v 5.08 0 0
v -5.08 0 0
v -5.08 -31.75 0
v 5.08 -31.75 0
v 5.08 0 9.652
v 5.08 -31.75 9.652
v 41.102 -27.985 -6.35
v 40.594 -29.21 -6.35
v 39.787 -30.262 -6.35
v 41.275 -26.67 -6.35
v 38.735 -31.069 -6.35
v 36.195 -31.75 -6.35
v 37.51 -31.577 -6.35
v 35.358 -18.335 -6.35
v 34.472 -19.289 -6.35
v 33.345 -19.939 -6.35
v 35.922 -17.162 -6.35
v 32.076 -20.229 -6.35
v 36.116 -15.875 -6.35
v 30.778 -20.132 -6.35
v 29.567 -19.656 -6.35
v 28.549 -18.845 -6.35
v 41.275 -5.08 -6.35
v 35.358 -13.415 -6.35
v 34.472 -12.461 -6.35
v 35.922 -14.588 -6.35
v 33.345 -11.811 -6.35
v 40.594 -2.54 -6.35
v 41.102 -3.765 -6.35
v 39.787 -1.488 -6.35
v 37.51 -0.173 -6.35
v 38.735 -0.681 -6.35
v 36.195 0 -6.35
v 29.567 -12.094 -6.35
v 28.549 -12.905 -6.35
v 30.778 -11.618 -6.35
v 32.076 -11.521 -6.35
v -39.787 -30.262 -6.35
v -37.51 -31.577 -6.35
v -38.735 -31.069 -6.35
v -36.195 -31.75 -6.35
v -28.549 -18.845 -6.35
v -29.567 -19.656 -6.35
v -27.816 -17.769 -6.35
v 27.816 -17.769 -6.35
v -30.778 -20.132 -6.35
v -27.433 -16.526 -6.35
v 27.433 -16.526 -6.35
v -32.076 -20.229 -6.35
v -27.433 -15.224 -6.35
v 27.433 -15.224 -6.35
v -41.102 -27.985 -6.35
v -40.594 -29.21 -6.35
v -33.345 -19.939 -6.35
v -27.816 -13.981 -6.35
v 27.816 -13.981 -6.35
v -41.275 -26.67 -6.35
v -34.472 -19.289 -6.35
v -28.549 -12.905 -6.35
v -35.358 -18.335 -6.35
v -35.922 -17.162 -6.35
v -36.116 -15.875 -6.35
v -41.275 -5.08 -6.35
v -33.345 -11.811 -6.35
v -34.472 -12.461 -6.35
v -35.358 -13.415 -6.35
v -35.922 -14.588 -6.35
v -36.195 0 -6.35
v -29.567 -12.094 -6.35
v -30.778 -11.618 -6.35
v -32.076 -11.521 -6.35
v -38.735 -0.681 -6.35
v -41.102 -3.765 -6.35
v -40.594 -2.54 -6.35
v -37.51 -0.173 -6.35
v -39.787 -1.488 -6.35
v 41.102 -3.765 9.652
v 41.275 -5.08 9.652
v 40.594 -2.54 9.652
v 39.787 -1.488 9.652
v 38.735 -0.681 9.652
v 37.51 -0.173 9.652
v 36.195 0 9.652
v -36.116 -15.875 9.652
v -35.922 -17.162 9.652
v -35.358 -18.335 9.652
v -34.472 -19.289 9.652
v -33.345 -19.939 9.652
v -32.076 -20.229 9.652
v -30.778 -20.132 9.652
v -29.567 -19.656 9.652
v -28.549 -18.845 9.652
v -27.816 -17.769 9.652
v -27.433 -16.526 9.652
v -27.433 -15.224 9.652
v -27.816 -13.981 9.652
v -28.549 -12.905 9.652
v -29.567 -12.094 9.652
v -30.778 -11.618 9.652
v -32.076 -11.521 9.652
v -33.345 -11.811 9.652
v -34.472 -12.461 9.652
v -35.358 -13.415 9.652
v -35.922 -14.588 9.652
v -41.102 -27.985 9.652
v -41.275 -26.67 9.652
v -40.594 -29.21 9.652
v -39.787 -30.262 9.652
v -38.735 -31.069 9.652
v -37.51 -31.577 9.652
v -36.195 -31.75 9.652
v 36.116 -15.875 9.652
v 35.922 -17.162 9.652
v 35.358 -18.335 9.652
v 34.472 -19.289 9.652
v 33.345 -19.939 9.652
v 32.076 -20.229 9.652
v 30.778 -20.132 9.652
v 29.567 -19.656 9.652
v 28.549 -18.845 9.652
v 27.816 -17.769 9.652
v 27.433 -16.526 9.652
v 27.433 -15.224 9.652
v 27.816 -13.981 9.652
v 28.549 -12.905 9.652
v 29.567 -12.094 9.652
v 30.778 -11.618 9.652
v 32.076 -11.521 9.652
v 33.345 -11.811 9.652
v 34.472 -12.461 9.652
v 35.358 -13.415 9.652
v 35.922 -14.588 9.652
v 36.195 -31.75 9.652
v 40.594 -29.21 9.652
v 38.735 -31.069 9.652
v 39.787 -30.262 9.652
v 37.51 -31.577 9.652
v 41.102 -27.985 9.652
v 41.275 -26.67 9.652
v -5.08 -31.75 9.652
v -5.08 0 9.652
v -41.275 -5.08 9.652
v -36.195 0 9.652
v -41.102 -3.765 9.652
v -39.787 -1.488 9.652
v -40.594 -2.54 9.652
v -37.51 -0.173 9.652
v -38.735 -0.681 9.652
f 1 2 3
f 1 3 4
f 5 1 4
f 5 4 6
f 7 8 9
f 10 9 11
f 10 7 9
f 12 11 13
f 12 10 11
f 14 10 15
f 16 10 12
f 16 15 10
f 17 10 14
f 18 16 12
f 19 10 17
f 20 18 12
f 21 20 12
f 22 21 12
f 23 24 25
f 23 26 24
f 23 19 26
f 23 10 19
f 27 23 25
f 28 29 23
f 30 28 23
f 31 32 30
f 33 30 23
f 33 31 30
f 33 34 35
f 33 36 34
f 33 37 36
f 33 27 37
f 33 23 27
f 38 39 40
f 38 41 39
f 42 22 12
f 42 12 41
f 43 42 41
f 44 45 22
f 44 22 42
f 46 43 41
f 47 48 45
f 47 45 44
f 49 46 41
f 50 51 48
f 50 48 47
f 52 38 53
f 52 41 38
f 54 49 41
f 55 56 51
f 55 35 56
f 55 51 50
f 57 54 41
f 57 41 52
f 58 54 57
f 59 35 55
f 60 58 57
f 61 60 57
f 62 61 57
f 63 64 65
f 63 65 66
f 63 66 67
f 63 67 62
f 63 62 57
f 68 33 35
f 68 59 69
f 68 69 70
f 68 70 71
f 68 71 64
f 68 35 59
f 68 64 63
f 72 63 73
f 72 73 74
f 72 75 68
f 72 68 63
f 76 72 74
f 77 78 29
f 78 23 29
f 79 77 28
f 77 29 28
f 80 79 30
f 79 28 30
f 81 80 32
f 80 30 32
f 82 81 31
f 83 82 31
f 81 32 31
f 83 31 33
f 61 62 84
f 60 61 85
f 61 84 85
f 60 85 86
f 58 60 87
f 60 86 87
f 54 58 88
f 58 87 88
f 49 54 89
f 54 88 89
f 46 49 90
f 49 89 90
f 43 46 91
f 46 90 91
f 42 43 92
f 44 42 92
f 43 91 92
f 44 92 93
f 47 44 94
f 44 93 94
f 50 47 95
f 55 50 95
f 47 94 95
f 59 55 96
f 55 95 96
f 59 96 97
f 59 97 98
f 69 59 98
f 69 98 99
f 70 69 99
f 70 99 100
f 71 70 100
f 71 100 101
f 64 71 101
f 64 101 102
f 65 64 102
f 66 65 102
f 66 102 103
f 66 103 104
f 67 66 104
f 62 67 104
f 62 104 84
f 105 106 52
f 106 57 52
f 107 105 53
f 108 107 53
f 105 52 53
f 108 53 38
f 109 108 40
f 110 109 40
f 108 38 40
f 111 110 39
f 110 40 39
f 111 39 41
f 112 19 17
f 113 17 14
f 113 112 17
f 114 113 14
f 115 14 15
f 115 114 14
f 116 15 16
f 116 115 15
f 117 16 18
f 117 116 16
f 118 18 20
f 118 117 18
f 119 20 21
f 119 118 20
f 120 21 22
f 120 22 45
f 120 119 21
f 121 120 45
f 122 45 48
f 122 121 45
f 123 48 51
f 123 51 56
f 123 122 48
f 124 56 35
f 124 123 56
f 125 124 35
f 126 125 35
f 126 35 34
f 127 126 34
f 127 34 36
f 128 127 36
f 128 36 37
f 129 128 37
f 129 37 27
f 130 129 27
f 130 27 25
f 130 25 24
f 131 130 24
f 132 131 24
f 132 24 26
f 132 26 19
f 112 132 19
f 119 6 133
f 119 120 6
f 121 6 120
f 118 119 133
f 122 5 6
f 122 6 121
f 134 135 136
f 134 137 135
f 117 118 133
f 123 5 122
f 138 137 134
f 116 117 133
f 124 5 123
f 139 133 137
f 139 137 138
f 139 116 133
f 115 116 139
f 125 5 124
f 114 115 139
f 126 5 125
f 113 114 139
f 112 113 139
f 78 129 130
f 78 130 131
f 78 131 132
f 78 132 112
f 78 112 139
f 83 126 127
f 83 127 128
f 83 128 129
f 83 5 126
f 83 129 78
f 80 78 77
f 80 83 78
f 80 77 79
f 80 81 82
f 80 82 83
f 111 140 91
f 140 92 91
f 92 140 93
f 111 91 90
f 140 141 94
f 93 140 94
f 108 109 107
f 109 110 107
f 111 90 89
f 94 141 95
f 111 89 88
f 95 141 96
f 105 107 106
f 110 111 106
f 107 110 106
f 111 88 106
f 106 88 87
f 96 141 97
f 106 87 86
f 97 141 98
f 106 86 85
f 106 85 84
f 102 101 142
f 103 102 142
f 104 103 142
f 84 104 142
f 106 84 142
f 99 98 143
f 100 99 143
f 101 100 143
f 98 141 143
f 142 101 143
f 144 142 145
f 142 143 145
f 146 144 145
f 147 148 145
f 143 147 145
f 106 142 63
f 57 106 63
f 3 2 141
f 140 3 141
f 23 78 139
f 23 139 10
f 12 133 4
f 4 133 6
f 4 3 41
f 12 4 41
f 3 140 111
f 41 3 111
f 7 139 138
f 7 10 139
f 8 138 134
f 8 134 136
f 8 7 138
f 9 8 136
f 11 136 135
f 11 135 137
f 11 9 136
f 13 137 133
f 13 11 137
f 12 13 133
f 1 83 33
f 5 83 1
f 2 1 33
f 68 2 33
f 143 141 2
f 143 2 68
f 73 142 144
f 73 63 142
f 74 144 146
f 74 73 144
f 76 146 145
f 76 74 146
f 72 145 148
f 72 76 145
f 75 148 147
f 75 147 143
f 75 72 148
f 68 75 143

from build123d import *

# Parameters (mm, degrees)
F1_DEPTH = 31.75
F2_R     = 5.08
F4_D     = 8.73252


with BuildPart() as f1:
    # F0 (on Front) → F1 (new body)
    with BuildSketch(Plane.XZ):
        Polygon((0, -6.35), (0, 0), (-5.08, 0), (-5.08, 9.652), (-41.275, 9.652), (-41.275, 0), (-41.275, -6.35), align=None)
    extrude(amount=F1_DEPTH)

    # F2
    f2_edges = [f1.edges().sort_by_distance(p)[0] for p in [
        (-41.275, -31.75, 1.651),
        (-41.275, 0, 1.651),
    ]]
    fillet(f2_edges, radius=F2_R)

    # F4 (through all)
    with Locations(Plane(origin=(0, 0, -6.35), x_dir=(1, 0, 0), z_dir=(0, 0, -1))):
        with Locations((-31.75, 15.875)):
            Hole(F4_D / 2)

    # F5: F1 across plane


with BuildPart() as f1_1:
    add(f1.part)
    add(f1.part.mirror(Plane.YZ))


solid = f1_1.part
